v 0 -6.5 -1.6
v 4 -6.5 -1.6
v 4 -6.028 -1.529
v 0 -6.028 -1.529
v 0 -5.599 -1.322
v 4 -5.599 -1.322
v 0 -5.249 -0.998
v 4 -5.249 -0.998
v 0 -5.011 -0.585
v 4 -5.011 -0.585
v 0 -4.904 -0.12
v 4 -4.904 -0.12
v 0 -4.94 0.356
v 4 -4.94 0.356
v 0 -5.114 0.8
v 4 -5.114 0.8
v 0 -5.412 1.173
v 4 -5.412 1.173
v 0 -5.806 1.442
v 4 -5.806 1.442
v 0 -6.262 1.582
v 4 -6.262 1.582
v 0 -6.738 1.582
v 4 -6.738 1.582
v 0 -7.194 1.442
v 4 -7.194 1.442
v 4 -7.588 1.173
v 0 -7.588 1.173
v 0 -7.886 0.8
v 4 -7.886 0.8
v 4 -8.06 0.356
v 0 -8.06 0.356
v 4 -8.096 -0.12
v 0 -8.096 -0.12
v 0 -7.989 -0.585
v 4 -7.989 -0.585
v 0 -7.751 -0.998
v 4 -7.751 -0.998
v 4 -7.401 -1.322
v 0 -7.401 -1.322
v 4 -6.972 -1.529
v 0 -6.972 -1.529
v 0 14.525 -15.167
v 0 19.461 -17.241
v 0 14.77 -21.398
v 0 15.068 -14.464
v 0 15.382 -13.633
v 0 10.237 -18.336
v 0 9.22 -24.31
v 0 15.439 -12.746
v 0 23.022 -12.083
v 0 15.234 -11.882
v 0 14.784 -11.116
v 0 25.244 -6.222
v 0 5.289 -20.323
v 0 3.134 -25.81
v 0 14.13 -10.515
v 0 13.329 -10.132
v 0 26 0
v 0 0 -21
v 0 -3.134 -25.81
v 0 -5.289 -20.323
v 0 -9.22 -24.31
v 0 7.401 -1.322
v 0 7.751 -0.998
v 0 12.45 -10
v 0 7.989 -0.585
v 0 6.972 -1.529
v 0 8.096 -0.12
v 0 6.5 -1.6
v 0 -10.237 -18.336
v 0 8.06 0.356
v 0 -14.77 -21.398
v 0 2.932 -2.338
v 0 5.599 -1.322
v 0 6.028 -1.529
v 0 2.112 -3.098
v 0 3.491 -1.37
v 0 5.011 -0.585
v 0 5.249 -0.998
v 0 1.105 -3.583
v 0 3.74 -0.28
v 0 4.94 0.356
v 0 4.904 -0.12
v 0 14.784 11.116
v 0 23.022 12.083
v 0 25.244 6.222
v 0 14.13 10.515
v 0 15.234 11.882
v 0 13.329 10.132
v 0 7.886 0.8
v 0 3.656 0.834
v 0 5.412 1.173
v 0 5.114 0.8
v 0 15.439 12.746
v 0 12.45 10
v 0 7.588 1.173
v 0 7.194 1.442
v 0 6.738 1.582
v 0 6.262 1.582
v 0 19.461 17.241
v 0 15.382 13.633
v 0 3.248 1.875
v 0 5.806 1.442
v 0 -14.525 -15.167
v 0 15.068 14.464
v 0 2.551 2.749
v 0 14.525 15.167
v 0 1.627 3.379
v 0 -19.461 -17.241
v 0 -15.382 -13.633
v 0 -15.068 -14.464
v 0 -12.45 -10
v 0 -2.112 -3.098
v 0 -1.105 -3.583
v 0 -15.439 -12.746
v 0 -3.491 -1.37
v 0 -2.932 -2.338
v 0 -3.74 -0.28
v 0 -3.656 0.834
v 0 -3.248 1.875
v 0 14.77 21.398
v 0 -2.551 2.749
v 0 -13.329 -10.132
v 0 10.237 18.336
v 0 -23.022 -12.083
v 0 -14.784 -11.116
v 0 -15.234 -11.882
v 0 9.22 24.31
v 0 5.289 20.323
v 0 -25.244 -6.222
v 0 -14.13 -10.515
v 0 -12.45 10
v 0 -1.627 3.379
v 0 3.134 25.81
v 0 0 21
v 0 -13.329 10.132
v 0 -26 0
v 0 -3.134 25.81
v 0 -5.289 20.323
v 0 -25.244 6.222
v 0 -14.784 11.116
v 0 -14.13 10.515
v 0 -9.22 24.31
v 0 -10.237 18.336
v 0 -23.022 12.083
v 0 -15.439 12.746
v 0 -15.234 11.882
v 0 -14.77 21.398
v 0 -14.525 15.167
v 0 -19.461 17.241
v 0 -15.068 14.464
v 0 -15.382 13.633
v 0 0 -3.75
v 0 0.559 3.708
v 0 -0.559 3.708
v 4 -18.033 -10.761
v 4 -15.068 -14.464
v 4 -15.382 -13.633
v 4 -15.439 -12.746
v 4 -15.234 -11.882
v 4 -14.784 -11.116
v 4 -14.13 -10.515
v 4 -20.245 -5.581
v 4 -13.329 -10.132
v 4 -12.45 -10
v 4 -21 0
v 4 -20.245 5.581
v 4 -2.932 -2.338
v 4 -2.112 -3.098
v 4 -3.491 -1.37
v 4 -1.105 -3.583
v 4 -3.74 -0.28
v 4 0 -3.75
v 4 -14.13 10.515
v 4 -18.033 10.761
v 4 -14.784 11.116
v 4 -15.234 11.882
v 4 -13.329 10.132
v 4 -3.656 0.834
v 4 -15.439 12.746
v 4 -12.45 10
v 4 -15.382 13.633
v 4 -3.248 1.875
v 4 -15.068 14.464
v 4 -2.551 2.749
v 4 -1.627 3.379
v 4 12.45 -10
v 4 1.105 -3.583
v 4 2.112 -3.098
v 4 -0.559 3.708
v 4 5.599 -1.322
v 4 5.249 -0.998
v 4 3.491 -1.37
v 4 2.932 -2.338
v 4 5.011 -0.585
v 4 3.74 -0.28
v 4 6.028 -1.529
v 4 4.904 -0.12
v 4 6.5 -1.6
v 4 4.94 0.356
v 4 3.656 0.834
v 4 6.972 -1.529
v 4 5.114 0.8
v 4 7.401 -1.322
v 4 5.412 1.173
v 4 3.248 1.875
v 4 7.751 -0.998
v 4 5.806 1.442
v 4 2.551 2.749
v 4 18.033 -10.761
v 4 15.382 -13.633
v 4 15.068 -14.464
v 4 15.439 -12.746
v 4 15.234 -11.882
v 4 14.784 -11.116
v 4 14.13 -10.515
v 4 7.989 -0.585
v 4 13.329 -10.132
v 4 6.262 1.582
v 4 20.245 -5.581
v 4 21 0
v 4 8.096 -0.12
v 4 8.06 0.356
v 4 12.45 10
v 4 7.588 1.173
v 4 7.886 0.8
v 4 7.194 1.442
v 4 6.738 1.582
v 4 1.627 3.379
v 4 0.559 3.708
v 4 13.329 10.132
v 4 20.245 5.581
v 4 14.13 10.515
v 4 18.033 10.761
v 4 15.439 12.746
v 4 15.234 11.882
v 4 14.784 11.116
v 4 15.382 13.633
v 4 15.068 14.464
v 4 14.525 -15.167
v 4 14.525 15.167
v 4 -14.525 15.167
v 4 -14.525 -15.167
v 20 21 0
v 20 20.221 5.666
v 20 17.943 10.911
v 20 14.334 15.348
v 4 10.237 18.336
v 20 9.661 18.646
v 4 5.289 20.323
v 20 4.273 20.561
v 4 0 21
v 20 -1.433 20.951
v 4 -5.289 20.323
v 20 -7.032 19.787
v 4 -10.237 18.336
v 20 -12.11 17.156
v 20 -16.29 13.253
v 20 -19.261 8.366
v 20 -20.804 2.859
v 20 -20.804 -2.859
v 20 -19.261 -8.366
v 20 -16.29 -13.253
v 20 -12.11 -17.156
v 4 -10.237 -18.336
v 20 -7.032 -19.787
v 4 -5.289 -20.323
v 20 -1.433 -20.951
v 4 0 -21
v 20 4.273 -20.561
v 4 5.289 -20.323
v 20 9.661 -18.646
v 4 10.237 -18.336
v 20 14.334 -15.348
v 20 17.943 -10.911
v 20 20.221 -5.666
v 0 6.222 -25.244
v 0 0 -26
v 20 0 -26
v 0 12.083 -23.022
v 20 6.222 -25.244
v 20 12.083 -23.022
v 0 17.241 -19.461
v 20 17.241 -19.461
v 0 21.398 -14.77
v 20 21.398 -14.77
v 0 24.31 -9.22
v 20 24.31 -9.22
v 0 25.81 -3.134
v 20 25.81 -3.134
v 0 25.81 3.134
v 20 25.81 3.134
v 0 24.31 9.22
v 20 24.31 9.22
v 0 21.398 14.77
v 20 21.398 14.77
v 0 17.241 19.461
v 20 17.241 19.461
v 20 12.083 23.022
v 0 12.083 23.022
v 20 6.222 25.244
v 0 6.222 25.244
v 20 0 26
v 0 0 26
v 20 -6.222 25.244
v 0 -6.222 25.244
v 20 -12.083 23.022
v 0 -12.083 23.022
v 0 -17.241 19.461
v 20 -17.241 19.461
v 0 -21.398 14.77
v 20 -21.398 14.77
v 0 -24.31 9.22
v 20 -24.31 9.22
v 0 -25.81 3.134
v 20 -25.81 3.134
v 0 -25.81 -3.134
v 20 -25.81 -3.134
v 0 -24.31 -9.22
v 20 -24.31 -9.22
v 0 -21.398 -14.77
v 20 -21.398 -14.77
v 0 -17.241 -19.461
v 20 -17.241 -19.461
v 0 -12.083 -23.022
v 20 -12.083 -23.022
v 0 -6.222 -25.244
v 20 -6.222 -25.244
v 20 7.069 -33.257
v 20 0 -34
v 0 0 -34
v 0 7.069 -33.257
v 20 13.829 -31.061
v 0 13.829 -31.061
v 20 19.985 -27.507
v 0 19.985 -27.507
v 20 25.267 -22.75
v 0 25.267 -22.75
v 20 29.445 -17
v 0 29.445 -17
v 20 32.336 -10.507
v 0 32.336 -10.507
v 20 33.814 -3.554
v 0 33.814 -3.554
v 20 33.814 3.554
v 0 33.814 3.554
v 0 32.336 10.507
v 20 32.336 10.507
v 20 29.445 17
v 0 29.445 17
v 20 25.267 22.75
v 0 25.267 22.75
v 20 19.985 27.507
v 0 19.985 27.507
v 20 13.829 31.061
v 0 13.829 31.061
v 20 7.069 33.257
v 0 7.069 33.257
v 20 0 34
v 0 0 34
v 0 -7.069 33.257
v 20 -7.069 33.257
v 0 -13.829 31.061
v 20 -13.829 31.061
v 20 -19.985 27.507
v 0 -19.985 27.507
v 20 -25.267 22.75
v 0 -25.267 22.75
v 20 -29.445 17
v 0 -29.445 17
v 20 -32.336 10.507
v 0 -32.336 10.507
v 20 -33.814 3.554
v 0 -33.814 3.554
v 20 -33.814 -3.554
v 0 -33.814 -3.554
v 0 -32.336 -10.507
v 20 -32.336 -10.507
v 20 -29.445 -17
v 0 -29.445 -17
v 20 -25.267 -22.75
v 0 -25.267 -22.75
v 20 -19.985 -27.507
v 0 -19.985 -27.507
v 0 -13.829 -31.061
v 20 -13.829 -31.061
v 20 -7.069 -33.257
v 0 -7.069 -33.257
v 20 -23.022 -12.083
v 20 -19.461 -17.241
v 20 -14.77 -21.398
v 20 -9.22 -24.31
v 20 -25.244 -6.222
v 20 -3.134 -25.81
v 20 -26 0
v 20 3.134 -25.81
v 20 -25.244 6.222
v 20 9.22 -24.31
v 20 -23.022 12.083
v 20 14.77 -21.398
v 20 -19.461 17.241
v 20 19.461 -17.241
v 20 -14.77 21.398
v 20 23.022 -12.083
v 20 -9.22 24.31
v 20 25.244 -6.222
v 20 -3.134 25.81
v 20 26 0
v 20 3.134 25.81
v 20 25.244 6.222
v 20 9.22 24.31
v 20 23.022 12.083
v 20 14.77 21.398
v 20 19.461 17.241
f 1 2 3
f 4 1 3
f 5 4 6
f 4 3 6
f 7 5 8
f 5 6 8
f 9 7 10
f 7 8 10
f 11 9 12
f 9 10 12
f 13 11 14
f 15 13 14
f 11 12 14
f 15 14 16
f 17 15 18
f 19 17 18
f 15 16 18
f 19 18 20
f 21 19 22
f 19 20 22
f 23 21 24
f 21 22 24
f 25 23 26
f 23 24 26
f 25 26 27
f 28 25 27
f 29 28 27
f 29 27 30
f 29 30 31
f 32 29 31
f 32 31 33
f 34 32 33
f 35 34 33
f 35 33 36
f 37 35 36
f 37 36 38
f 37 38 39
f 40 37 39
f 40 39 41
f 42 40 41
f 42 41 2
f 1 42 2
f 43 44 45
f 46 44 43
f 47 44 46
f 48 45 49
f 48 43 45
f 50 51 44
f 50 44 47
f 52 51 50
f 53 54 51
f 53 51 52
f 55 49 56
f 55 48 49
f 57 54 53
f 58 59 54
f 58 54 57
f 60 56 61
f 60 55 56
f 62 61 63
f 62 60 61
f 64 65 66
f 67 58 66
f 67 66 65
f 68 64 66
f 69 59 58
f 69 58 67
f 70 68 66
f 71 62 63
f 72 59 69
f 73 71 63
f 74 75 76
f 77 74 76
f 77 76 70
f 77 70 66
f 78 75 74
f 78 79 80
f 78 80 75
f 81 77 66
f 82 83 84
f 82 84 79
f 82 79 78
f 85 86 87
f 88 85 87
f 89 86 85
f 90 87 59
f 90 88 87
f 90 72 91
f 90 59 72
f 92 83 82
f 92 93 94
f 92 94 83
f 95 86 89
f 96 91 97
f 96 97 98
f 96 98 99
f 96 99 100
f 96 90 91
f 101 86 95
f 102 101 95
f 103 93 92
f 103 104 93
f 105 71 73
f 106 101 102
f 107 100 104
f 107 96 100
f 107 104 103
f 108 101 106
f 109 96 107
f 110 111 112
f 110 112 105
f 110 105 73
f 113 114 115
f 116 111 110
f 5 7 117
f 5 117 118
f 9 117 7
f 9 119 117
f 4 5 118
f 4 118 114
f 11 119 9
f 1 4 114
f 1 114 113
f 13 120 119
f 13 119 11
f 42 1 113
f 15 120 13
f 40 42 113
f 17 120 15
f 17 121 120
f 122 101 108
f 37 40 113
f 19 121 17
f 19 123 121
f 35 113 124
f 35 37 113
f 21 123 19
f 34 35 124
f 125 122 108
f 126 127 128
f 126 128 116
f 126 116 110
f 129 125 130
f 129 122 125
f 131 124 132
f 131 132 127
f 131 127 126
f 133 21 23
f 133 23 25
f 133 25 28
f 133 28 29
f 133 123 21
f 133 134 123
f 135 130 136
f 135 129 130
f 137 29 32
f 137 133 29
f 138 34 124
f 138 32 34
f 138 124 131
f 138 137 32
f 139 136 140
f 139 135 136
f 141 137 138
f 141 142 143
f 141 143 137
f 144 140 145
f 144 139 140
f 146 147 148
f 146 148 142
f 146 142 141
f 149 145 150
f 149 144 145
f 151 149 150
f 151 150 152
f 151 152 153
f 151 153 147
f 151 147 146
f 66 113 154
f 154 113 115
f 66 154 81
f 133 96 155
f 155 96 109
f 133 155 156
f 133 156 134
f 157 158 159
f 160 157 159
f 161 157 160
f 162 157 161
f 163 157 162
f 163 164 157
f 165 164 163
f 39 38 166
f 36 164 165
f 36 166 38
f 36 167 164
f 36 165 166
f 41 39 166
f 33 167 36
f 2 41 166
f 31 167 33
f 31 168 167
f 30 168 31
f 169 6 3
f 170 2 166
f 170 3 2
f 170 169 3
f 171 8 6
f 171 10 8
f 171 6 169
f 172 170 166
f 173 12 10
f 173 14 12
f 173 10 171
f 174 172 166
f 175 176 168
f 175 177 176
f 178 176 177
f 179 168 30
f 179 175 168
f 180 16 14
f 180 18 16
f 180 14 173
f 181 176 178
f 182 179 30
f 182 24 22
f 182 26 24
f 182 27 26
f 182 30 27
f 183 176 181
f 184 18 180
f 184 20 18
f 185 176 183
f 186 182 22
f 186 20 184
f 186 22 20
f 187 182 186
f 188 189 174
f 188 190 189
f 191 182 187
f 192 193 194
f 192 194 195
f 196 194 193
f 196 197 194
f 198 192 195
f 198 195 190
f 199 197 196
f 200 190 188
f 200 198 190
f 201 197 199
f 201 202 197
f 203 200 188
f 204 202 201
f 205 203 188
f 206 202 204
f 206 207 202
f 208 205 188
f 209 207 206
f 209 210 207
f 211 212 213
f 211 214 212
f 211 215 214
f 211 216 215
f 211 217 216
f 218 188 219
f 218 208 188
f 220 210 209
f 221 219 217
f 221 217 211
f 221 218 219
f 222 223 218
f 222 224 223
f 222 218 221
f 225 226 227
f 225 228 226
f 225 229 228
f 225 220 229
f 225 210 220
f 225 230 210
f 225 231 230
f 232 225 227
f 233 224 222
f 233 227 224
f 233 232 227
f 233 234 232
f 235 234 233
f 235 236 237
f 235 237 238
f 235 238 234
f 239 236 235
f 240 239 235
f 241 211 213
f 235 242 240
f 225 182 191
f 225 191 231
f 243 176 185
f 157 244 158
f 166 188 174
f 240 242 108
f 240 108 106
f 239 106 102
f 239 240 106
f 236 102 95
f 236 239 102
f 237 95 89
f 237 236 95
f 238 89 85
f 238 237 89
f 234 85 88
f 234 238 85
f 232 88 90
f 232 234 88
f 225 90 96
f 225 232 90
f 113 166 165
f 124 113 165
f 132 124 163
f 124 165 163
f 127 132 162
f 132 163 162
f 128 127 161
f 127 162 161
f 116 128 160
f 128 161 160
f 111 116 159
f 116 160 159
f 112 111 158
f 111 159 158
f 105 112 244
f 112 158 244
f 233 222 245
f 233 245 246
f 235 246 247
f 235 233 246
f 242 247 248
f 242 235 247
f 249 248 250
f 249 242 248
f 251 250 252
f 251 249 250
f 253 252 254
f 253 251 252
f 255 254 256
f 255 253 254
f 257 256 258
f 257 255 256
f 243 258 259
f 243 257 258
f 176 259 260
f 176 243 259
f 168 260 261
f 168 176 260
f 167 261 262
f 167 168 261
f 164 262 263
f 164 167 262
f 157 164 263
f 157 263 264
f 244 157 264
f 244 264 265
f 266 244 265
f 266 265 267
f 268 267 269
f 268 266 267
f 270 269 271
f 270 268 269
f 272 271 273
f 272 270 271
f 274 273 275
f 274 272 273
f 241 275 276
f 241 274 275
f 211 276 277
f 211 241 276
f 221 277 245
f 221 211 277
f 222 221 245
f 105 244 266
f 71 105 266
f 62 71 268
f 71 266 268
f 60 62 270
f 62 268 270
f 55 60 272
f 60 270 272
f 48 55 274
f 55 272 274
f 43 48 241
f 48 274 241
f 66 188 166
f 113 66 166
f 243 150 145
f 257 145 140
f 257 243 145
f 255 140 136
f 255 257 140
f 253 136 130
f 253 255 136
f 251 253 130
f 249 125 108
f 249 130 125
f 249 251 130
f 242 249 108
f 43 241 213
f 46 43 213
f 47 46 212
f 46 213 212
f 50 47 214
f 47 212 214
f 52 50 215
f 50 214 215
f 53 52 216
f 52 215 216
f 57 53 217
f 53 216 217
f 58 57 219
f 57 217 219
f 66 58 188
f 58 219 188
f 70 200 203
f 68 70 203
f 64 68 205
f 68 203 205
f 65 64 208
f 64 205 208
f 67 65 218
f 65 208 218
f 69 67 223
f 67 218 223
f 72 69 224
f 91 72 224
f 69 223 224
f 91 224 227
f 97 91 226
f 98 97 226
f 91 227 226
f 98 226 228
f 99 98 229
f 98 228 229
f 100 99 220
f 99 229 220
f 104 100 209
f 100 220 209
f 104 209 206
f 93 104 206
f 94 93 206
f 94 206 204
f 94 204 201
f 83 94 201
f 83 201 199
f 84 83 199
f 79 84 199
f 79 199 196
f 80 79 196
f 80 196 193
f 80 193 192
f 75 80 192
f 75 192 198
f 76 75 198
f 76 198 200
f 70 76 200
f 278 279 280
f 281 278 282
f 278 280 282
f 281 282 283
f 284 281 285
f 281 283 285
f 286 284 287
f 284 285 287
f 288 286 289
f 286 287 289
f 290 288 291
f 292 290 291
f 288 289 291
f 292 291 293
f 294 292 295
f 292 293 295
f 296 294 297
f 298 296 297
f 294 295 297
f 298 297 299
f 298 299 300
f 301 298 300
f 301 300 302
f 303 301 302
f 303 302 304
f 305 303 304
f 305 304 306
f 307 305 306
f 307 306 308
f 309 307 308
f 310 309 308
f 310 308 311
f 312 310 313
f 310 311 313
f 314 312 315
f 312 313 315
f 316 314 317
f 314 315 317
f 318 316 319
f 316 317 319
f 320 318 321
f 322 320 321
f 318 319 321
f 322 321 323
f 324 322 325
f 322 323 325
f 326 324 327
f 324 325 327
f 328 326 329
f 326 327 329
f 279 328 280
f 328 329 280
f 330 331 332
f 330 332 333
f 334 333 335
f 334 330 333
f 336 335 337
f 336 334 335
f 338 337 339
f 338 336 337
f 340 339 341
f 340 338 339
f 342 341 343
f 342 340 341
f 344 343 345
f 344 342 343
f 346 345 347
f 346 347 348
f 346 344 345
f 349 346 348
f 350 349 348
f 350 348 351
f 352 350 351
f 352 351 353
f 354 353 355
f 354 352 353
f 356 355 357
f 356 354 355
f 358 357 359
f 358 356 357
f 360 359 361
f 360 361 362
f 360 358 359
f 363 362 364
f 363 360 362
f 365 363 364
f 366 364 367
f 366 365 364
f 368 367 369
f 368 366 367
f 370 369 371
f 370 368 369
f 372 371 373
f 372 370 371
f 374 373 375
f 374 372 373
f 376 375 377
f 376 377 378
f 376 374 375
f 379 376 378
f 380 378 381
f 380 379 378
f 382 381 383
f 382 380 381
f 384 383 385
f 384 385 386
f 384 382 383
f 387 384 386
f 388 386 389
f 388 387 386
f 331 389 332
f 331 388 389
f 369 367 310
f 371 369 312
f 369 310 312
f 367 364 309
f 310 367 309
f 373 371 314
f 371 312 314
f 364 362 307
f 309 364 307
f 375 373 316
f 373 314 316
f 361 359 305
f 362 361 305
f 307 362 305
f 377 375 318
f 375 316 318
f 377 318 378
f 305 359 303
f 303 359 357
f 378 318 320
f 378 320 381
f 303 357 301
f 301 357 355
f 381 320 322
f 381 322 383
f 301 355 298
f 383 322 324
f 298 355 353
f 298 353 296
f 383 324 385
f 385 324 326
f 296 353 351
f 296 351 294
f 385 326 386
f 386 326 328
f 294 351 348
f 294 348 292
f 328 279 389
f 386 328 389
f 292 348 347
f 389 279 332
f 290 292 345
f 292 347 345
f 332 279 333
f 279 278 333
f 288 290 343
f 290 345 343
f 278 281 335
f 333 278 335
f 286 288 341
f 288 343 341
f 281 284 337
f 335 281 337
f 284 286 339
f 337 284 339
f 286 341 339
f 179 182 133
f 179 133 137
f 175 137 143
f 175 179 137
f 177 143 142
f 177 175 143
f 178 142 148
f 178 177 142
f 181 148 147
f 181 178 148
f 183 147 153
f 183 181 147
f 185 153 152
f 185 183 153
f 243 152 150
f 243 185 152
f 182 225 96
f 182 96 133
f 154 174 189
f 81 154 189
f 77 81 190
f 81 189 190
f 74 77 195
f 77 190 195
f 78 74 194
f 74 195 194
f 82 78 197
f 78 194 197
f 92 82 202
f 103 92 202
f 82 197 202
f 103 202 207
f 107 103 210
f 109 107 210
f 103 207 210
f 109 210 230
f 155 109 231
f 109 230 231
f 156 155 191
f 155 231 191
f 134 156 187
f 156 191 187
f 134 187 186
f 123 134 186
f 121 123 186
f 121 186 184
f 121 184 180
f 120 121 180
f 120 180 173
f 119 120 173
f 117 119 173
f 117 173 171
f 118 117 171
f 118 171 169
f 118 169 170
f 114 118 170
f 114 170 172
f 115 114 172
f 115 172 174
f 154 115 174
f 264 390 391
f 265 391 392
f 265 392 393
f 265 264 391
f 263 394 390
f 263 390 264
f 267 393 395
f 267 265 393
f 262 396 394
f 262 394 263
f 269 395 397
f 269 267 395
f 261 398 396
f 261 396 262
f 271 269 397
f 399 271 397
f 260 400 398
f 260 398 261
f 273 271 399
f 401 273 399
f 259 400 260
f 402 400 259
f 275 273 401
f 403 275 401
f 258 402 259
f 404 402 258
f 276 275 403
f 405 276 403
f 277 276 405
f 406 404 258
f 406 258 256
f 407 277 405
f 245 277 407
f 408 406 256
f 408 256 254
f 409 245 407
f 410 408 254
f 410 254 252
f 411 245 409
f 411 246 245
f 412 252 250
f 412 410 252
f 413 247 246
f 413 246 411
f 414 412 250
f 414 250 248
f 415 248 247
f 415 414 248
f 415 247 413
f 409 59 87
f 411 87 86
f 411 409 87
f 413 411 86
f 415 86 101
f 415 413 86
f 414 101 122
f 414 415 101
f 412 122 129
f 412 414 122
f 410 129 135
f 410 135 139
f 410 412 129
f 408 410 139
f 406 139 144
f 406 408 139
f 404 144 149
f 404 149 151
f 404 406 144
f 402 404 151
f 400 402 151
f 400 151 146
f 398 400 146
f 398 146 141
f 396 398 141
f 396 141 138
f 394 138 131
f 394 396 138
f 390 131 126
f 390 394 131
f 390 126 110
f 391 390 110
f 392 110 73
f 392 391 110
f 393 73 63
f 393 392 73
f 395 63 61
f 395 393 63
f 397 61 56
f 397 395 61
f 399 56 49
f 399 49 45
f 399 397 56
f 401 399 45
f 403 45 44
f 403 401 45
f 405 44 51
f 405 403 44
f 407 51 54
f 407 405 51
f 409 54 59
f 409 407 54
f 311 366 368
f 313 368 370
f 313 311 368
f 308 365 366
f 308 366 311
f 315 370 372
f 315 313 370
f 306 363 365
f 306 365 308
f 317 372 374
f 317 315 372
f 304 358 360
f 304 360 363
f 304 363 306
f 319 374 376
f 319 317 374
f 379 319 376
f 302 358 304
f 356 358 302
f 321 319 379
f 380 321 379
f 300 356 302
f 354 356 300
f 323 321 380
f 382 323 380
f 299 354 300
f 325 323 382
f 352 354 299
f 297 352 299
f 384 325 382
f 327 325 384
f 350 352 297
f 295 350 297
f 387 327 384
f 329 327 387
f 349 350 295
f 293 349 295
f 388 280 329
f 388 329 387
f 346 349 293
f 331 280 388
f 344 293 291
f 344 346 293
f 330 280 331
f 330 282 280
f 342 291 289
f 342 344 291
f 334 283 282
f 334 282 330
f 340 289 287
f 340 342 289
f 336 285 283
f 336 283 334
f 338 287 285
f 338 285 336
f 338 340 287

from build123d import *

# Parameters (mm, degrees)
SKETCH_2_R          = 3.75
SKETCH_2_R_2        = 1.6
CUT_EXTRUDE_1_DEPTH = 10
SKETCH_3_R          = 34
SKETCH_3_R_2        = 26
EXTRUDE_1_DEPTH     = 20


with BuildPart() as part:
    # 草图1 → 旋转1 (revolve)
    with BuildSketch(Plane.XY):
        Polygon((0, 0), (0, 26), (20, 26), (20, 21), (4, 21), (4, 0), align=None)
    revolve(axis=Axis((0, 0, 0), (1, 0, 0)))

    # 草图2 → 切除-拉伸1 (cut)
    with BuildSketch(Plane(origin=(4, 0, 0), x_dir=(0, 0, -1), z_dir=(1, 0, 0))):
        Circle(SKETCH_2_R)
        with Locations((0, 6.5)):
            Circle(SKETCH_2_R_2)
        with Locations((0, -6.5)):
            Circle(SKETCH_2_R_2)
        with BuildLine():
            Line((-10, 12.449899598), (-10, -12.449899598))
            ThreePointArc((-10, -12.449899598), (-11.881966011, -15.233781779), (-15.166666667, -14.524882864))
            ThreePointArc((-15.166666667, -14.524882864), (-21, 0), (-15.166666667, 14.524882864))
            ThreePointArc((-15.166666667, 14.524882864), (-11.881966011, 15.233781779), (-10, 12.449899598))
        make_face()
        with BuildLine():
            Line((10, 12.449899598), (10, -12.449899598))
            ThreePointArc((10, -12.449899598), (11.881966011, -15.233781779), (15.166666667, -14.524882864))
            ThreePointArc((15.166666667, -14.524882864), (21, 0), (15.166666667, 14.524882864))
            ThreePointArc((15.166666667, 14.524882864), (11.881966011, 15.233781779), (10, 12.449899598))
        make_face()
    extrude(amount=-CUT_EXTRUDE_1_DEPTH, mode=Mode.SUBTRACT)


with BuildPart() as body_2:
    # 草图3 → 凸台-拉伸1 (new body)
    with BuildSketch(Plane(origin=(20, 0, 0), x_dir=(0, 0, -1), z_dir=(1, 0, 0))):
        Circle(SKETCH_3_R)
        Circle(SKETCH_3_R_2, mode=Mode.SUBTRACT)
    extrude(amount=-EXTRUDE_1_DEPTH)


solid = Compound([part.part, body_2.part])
